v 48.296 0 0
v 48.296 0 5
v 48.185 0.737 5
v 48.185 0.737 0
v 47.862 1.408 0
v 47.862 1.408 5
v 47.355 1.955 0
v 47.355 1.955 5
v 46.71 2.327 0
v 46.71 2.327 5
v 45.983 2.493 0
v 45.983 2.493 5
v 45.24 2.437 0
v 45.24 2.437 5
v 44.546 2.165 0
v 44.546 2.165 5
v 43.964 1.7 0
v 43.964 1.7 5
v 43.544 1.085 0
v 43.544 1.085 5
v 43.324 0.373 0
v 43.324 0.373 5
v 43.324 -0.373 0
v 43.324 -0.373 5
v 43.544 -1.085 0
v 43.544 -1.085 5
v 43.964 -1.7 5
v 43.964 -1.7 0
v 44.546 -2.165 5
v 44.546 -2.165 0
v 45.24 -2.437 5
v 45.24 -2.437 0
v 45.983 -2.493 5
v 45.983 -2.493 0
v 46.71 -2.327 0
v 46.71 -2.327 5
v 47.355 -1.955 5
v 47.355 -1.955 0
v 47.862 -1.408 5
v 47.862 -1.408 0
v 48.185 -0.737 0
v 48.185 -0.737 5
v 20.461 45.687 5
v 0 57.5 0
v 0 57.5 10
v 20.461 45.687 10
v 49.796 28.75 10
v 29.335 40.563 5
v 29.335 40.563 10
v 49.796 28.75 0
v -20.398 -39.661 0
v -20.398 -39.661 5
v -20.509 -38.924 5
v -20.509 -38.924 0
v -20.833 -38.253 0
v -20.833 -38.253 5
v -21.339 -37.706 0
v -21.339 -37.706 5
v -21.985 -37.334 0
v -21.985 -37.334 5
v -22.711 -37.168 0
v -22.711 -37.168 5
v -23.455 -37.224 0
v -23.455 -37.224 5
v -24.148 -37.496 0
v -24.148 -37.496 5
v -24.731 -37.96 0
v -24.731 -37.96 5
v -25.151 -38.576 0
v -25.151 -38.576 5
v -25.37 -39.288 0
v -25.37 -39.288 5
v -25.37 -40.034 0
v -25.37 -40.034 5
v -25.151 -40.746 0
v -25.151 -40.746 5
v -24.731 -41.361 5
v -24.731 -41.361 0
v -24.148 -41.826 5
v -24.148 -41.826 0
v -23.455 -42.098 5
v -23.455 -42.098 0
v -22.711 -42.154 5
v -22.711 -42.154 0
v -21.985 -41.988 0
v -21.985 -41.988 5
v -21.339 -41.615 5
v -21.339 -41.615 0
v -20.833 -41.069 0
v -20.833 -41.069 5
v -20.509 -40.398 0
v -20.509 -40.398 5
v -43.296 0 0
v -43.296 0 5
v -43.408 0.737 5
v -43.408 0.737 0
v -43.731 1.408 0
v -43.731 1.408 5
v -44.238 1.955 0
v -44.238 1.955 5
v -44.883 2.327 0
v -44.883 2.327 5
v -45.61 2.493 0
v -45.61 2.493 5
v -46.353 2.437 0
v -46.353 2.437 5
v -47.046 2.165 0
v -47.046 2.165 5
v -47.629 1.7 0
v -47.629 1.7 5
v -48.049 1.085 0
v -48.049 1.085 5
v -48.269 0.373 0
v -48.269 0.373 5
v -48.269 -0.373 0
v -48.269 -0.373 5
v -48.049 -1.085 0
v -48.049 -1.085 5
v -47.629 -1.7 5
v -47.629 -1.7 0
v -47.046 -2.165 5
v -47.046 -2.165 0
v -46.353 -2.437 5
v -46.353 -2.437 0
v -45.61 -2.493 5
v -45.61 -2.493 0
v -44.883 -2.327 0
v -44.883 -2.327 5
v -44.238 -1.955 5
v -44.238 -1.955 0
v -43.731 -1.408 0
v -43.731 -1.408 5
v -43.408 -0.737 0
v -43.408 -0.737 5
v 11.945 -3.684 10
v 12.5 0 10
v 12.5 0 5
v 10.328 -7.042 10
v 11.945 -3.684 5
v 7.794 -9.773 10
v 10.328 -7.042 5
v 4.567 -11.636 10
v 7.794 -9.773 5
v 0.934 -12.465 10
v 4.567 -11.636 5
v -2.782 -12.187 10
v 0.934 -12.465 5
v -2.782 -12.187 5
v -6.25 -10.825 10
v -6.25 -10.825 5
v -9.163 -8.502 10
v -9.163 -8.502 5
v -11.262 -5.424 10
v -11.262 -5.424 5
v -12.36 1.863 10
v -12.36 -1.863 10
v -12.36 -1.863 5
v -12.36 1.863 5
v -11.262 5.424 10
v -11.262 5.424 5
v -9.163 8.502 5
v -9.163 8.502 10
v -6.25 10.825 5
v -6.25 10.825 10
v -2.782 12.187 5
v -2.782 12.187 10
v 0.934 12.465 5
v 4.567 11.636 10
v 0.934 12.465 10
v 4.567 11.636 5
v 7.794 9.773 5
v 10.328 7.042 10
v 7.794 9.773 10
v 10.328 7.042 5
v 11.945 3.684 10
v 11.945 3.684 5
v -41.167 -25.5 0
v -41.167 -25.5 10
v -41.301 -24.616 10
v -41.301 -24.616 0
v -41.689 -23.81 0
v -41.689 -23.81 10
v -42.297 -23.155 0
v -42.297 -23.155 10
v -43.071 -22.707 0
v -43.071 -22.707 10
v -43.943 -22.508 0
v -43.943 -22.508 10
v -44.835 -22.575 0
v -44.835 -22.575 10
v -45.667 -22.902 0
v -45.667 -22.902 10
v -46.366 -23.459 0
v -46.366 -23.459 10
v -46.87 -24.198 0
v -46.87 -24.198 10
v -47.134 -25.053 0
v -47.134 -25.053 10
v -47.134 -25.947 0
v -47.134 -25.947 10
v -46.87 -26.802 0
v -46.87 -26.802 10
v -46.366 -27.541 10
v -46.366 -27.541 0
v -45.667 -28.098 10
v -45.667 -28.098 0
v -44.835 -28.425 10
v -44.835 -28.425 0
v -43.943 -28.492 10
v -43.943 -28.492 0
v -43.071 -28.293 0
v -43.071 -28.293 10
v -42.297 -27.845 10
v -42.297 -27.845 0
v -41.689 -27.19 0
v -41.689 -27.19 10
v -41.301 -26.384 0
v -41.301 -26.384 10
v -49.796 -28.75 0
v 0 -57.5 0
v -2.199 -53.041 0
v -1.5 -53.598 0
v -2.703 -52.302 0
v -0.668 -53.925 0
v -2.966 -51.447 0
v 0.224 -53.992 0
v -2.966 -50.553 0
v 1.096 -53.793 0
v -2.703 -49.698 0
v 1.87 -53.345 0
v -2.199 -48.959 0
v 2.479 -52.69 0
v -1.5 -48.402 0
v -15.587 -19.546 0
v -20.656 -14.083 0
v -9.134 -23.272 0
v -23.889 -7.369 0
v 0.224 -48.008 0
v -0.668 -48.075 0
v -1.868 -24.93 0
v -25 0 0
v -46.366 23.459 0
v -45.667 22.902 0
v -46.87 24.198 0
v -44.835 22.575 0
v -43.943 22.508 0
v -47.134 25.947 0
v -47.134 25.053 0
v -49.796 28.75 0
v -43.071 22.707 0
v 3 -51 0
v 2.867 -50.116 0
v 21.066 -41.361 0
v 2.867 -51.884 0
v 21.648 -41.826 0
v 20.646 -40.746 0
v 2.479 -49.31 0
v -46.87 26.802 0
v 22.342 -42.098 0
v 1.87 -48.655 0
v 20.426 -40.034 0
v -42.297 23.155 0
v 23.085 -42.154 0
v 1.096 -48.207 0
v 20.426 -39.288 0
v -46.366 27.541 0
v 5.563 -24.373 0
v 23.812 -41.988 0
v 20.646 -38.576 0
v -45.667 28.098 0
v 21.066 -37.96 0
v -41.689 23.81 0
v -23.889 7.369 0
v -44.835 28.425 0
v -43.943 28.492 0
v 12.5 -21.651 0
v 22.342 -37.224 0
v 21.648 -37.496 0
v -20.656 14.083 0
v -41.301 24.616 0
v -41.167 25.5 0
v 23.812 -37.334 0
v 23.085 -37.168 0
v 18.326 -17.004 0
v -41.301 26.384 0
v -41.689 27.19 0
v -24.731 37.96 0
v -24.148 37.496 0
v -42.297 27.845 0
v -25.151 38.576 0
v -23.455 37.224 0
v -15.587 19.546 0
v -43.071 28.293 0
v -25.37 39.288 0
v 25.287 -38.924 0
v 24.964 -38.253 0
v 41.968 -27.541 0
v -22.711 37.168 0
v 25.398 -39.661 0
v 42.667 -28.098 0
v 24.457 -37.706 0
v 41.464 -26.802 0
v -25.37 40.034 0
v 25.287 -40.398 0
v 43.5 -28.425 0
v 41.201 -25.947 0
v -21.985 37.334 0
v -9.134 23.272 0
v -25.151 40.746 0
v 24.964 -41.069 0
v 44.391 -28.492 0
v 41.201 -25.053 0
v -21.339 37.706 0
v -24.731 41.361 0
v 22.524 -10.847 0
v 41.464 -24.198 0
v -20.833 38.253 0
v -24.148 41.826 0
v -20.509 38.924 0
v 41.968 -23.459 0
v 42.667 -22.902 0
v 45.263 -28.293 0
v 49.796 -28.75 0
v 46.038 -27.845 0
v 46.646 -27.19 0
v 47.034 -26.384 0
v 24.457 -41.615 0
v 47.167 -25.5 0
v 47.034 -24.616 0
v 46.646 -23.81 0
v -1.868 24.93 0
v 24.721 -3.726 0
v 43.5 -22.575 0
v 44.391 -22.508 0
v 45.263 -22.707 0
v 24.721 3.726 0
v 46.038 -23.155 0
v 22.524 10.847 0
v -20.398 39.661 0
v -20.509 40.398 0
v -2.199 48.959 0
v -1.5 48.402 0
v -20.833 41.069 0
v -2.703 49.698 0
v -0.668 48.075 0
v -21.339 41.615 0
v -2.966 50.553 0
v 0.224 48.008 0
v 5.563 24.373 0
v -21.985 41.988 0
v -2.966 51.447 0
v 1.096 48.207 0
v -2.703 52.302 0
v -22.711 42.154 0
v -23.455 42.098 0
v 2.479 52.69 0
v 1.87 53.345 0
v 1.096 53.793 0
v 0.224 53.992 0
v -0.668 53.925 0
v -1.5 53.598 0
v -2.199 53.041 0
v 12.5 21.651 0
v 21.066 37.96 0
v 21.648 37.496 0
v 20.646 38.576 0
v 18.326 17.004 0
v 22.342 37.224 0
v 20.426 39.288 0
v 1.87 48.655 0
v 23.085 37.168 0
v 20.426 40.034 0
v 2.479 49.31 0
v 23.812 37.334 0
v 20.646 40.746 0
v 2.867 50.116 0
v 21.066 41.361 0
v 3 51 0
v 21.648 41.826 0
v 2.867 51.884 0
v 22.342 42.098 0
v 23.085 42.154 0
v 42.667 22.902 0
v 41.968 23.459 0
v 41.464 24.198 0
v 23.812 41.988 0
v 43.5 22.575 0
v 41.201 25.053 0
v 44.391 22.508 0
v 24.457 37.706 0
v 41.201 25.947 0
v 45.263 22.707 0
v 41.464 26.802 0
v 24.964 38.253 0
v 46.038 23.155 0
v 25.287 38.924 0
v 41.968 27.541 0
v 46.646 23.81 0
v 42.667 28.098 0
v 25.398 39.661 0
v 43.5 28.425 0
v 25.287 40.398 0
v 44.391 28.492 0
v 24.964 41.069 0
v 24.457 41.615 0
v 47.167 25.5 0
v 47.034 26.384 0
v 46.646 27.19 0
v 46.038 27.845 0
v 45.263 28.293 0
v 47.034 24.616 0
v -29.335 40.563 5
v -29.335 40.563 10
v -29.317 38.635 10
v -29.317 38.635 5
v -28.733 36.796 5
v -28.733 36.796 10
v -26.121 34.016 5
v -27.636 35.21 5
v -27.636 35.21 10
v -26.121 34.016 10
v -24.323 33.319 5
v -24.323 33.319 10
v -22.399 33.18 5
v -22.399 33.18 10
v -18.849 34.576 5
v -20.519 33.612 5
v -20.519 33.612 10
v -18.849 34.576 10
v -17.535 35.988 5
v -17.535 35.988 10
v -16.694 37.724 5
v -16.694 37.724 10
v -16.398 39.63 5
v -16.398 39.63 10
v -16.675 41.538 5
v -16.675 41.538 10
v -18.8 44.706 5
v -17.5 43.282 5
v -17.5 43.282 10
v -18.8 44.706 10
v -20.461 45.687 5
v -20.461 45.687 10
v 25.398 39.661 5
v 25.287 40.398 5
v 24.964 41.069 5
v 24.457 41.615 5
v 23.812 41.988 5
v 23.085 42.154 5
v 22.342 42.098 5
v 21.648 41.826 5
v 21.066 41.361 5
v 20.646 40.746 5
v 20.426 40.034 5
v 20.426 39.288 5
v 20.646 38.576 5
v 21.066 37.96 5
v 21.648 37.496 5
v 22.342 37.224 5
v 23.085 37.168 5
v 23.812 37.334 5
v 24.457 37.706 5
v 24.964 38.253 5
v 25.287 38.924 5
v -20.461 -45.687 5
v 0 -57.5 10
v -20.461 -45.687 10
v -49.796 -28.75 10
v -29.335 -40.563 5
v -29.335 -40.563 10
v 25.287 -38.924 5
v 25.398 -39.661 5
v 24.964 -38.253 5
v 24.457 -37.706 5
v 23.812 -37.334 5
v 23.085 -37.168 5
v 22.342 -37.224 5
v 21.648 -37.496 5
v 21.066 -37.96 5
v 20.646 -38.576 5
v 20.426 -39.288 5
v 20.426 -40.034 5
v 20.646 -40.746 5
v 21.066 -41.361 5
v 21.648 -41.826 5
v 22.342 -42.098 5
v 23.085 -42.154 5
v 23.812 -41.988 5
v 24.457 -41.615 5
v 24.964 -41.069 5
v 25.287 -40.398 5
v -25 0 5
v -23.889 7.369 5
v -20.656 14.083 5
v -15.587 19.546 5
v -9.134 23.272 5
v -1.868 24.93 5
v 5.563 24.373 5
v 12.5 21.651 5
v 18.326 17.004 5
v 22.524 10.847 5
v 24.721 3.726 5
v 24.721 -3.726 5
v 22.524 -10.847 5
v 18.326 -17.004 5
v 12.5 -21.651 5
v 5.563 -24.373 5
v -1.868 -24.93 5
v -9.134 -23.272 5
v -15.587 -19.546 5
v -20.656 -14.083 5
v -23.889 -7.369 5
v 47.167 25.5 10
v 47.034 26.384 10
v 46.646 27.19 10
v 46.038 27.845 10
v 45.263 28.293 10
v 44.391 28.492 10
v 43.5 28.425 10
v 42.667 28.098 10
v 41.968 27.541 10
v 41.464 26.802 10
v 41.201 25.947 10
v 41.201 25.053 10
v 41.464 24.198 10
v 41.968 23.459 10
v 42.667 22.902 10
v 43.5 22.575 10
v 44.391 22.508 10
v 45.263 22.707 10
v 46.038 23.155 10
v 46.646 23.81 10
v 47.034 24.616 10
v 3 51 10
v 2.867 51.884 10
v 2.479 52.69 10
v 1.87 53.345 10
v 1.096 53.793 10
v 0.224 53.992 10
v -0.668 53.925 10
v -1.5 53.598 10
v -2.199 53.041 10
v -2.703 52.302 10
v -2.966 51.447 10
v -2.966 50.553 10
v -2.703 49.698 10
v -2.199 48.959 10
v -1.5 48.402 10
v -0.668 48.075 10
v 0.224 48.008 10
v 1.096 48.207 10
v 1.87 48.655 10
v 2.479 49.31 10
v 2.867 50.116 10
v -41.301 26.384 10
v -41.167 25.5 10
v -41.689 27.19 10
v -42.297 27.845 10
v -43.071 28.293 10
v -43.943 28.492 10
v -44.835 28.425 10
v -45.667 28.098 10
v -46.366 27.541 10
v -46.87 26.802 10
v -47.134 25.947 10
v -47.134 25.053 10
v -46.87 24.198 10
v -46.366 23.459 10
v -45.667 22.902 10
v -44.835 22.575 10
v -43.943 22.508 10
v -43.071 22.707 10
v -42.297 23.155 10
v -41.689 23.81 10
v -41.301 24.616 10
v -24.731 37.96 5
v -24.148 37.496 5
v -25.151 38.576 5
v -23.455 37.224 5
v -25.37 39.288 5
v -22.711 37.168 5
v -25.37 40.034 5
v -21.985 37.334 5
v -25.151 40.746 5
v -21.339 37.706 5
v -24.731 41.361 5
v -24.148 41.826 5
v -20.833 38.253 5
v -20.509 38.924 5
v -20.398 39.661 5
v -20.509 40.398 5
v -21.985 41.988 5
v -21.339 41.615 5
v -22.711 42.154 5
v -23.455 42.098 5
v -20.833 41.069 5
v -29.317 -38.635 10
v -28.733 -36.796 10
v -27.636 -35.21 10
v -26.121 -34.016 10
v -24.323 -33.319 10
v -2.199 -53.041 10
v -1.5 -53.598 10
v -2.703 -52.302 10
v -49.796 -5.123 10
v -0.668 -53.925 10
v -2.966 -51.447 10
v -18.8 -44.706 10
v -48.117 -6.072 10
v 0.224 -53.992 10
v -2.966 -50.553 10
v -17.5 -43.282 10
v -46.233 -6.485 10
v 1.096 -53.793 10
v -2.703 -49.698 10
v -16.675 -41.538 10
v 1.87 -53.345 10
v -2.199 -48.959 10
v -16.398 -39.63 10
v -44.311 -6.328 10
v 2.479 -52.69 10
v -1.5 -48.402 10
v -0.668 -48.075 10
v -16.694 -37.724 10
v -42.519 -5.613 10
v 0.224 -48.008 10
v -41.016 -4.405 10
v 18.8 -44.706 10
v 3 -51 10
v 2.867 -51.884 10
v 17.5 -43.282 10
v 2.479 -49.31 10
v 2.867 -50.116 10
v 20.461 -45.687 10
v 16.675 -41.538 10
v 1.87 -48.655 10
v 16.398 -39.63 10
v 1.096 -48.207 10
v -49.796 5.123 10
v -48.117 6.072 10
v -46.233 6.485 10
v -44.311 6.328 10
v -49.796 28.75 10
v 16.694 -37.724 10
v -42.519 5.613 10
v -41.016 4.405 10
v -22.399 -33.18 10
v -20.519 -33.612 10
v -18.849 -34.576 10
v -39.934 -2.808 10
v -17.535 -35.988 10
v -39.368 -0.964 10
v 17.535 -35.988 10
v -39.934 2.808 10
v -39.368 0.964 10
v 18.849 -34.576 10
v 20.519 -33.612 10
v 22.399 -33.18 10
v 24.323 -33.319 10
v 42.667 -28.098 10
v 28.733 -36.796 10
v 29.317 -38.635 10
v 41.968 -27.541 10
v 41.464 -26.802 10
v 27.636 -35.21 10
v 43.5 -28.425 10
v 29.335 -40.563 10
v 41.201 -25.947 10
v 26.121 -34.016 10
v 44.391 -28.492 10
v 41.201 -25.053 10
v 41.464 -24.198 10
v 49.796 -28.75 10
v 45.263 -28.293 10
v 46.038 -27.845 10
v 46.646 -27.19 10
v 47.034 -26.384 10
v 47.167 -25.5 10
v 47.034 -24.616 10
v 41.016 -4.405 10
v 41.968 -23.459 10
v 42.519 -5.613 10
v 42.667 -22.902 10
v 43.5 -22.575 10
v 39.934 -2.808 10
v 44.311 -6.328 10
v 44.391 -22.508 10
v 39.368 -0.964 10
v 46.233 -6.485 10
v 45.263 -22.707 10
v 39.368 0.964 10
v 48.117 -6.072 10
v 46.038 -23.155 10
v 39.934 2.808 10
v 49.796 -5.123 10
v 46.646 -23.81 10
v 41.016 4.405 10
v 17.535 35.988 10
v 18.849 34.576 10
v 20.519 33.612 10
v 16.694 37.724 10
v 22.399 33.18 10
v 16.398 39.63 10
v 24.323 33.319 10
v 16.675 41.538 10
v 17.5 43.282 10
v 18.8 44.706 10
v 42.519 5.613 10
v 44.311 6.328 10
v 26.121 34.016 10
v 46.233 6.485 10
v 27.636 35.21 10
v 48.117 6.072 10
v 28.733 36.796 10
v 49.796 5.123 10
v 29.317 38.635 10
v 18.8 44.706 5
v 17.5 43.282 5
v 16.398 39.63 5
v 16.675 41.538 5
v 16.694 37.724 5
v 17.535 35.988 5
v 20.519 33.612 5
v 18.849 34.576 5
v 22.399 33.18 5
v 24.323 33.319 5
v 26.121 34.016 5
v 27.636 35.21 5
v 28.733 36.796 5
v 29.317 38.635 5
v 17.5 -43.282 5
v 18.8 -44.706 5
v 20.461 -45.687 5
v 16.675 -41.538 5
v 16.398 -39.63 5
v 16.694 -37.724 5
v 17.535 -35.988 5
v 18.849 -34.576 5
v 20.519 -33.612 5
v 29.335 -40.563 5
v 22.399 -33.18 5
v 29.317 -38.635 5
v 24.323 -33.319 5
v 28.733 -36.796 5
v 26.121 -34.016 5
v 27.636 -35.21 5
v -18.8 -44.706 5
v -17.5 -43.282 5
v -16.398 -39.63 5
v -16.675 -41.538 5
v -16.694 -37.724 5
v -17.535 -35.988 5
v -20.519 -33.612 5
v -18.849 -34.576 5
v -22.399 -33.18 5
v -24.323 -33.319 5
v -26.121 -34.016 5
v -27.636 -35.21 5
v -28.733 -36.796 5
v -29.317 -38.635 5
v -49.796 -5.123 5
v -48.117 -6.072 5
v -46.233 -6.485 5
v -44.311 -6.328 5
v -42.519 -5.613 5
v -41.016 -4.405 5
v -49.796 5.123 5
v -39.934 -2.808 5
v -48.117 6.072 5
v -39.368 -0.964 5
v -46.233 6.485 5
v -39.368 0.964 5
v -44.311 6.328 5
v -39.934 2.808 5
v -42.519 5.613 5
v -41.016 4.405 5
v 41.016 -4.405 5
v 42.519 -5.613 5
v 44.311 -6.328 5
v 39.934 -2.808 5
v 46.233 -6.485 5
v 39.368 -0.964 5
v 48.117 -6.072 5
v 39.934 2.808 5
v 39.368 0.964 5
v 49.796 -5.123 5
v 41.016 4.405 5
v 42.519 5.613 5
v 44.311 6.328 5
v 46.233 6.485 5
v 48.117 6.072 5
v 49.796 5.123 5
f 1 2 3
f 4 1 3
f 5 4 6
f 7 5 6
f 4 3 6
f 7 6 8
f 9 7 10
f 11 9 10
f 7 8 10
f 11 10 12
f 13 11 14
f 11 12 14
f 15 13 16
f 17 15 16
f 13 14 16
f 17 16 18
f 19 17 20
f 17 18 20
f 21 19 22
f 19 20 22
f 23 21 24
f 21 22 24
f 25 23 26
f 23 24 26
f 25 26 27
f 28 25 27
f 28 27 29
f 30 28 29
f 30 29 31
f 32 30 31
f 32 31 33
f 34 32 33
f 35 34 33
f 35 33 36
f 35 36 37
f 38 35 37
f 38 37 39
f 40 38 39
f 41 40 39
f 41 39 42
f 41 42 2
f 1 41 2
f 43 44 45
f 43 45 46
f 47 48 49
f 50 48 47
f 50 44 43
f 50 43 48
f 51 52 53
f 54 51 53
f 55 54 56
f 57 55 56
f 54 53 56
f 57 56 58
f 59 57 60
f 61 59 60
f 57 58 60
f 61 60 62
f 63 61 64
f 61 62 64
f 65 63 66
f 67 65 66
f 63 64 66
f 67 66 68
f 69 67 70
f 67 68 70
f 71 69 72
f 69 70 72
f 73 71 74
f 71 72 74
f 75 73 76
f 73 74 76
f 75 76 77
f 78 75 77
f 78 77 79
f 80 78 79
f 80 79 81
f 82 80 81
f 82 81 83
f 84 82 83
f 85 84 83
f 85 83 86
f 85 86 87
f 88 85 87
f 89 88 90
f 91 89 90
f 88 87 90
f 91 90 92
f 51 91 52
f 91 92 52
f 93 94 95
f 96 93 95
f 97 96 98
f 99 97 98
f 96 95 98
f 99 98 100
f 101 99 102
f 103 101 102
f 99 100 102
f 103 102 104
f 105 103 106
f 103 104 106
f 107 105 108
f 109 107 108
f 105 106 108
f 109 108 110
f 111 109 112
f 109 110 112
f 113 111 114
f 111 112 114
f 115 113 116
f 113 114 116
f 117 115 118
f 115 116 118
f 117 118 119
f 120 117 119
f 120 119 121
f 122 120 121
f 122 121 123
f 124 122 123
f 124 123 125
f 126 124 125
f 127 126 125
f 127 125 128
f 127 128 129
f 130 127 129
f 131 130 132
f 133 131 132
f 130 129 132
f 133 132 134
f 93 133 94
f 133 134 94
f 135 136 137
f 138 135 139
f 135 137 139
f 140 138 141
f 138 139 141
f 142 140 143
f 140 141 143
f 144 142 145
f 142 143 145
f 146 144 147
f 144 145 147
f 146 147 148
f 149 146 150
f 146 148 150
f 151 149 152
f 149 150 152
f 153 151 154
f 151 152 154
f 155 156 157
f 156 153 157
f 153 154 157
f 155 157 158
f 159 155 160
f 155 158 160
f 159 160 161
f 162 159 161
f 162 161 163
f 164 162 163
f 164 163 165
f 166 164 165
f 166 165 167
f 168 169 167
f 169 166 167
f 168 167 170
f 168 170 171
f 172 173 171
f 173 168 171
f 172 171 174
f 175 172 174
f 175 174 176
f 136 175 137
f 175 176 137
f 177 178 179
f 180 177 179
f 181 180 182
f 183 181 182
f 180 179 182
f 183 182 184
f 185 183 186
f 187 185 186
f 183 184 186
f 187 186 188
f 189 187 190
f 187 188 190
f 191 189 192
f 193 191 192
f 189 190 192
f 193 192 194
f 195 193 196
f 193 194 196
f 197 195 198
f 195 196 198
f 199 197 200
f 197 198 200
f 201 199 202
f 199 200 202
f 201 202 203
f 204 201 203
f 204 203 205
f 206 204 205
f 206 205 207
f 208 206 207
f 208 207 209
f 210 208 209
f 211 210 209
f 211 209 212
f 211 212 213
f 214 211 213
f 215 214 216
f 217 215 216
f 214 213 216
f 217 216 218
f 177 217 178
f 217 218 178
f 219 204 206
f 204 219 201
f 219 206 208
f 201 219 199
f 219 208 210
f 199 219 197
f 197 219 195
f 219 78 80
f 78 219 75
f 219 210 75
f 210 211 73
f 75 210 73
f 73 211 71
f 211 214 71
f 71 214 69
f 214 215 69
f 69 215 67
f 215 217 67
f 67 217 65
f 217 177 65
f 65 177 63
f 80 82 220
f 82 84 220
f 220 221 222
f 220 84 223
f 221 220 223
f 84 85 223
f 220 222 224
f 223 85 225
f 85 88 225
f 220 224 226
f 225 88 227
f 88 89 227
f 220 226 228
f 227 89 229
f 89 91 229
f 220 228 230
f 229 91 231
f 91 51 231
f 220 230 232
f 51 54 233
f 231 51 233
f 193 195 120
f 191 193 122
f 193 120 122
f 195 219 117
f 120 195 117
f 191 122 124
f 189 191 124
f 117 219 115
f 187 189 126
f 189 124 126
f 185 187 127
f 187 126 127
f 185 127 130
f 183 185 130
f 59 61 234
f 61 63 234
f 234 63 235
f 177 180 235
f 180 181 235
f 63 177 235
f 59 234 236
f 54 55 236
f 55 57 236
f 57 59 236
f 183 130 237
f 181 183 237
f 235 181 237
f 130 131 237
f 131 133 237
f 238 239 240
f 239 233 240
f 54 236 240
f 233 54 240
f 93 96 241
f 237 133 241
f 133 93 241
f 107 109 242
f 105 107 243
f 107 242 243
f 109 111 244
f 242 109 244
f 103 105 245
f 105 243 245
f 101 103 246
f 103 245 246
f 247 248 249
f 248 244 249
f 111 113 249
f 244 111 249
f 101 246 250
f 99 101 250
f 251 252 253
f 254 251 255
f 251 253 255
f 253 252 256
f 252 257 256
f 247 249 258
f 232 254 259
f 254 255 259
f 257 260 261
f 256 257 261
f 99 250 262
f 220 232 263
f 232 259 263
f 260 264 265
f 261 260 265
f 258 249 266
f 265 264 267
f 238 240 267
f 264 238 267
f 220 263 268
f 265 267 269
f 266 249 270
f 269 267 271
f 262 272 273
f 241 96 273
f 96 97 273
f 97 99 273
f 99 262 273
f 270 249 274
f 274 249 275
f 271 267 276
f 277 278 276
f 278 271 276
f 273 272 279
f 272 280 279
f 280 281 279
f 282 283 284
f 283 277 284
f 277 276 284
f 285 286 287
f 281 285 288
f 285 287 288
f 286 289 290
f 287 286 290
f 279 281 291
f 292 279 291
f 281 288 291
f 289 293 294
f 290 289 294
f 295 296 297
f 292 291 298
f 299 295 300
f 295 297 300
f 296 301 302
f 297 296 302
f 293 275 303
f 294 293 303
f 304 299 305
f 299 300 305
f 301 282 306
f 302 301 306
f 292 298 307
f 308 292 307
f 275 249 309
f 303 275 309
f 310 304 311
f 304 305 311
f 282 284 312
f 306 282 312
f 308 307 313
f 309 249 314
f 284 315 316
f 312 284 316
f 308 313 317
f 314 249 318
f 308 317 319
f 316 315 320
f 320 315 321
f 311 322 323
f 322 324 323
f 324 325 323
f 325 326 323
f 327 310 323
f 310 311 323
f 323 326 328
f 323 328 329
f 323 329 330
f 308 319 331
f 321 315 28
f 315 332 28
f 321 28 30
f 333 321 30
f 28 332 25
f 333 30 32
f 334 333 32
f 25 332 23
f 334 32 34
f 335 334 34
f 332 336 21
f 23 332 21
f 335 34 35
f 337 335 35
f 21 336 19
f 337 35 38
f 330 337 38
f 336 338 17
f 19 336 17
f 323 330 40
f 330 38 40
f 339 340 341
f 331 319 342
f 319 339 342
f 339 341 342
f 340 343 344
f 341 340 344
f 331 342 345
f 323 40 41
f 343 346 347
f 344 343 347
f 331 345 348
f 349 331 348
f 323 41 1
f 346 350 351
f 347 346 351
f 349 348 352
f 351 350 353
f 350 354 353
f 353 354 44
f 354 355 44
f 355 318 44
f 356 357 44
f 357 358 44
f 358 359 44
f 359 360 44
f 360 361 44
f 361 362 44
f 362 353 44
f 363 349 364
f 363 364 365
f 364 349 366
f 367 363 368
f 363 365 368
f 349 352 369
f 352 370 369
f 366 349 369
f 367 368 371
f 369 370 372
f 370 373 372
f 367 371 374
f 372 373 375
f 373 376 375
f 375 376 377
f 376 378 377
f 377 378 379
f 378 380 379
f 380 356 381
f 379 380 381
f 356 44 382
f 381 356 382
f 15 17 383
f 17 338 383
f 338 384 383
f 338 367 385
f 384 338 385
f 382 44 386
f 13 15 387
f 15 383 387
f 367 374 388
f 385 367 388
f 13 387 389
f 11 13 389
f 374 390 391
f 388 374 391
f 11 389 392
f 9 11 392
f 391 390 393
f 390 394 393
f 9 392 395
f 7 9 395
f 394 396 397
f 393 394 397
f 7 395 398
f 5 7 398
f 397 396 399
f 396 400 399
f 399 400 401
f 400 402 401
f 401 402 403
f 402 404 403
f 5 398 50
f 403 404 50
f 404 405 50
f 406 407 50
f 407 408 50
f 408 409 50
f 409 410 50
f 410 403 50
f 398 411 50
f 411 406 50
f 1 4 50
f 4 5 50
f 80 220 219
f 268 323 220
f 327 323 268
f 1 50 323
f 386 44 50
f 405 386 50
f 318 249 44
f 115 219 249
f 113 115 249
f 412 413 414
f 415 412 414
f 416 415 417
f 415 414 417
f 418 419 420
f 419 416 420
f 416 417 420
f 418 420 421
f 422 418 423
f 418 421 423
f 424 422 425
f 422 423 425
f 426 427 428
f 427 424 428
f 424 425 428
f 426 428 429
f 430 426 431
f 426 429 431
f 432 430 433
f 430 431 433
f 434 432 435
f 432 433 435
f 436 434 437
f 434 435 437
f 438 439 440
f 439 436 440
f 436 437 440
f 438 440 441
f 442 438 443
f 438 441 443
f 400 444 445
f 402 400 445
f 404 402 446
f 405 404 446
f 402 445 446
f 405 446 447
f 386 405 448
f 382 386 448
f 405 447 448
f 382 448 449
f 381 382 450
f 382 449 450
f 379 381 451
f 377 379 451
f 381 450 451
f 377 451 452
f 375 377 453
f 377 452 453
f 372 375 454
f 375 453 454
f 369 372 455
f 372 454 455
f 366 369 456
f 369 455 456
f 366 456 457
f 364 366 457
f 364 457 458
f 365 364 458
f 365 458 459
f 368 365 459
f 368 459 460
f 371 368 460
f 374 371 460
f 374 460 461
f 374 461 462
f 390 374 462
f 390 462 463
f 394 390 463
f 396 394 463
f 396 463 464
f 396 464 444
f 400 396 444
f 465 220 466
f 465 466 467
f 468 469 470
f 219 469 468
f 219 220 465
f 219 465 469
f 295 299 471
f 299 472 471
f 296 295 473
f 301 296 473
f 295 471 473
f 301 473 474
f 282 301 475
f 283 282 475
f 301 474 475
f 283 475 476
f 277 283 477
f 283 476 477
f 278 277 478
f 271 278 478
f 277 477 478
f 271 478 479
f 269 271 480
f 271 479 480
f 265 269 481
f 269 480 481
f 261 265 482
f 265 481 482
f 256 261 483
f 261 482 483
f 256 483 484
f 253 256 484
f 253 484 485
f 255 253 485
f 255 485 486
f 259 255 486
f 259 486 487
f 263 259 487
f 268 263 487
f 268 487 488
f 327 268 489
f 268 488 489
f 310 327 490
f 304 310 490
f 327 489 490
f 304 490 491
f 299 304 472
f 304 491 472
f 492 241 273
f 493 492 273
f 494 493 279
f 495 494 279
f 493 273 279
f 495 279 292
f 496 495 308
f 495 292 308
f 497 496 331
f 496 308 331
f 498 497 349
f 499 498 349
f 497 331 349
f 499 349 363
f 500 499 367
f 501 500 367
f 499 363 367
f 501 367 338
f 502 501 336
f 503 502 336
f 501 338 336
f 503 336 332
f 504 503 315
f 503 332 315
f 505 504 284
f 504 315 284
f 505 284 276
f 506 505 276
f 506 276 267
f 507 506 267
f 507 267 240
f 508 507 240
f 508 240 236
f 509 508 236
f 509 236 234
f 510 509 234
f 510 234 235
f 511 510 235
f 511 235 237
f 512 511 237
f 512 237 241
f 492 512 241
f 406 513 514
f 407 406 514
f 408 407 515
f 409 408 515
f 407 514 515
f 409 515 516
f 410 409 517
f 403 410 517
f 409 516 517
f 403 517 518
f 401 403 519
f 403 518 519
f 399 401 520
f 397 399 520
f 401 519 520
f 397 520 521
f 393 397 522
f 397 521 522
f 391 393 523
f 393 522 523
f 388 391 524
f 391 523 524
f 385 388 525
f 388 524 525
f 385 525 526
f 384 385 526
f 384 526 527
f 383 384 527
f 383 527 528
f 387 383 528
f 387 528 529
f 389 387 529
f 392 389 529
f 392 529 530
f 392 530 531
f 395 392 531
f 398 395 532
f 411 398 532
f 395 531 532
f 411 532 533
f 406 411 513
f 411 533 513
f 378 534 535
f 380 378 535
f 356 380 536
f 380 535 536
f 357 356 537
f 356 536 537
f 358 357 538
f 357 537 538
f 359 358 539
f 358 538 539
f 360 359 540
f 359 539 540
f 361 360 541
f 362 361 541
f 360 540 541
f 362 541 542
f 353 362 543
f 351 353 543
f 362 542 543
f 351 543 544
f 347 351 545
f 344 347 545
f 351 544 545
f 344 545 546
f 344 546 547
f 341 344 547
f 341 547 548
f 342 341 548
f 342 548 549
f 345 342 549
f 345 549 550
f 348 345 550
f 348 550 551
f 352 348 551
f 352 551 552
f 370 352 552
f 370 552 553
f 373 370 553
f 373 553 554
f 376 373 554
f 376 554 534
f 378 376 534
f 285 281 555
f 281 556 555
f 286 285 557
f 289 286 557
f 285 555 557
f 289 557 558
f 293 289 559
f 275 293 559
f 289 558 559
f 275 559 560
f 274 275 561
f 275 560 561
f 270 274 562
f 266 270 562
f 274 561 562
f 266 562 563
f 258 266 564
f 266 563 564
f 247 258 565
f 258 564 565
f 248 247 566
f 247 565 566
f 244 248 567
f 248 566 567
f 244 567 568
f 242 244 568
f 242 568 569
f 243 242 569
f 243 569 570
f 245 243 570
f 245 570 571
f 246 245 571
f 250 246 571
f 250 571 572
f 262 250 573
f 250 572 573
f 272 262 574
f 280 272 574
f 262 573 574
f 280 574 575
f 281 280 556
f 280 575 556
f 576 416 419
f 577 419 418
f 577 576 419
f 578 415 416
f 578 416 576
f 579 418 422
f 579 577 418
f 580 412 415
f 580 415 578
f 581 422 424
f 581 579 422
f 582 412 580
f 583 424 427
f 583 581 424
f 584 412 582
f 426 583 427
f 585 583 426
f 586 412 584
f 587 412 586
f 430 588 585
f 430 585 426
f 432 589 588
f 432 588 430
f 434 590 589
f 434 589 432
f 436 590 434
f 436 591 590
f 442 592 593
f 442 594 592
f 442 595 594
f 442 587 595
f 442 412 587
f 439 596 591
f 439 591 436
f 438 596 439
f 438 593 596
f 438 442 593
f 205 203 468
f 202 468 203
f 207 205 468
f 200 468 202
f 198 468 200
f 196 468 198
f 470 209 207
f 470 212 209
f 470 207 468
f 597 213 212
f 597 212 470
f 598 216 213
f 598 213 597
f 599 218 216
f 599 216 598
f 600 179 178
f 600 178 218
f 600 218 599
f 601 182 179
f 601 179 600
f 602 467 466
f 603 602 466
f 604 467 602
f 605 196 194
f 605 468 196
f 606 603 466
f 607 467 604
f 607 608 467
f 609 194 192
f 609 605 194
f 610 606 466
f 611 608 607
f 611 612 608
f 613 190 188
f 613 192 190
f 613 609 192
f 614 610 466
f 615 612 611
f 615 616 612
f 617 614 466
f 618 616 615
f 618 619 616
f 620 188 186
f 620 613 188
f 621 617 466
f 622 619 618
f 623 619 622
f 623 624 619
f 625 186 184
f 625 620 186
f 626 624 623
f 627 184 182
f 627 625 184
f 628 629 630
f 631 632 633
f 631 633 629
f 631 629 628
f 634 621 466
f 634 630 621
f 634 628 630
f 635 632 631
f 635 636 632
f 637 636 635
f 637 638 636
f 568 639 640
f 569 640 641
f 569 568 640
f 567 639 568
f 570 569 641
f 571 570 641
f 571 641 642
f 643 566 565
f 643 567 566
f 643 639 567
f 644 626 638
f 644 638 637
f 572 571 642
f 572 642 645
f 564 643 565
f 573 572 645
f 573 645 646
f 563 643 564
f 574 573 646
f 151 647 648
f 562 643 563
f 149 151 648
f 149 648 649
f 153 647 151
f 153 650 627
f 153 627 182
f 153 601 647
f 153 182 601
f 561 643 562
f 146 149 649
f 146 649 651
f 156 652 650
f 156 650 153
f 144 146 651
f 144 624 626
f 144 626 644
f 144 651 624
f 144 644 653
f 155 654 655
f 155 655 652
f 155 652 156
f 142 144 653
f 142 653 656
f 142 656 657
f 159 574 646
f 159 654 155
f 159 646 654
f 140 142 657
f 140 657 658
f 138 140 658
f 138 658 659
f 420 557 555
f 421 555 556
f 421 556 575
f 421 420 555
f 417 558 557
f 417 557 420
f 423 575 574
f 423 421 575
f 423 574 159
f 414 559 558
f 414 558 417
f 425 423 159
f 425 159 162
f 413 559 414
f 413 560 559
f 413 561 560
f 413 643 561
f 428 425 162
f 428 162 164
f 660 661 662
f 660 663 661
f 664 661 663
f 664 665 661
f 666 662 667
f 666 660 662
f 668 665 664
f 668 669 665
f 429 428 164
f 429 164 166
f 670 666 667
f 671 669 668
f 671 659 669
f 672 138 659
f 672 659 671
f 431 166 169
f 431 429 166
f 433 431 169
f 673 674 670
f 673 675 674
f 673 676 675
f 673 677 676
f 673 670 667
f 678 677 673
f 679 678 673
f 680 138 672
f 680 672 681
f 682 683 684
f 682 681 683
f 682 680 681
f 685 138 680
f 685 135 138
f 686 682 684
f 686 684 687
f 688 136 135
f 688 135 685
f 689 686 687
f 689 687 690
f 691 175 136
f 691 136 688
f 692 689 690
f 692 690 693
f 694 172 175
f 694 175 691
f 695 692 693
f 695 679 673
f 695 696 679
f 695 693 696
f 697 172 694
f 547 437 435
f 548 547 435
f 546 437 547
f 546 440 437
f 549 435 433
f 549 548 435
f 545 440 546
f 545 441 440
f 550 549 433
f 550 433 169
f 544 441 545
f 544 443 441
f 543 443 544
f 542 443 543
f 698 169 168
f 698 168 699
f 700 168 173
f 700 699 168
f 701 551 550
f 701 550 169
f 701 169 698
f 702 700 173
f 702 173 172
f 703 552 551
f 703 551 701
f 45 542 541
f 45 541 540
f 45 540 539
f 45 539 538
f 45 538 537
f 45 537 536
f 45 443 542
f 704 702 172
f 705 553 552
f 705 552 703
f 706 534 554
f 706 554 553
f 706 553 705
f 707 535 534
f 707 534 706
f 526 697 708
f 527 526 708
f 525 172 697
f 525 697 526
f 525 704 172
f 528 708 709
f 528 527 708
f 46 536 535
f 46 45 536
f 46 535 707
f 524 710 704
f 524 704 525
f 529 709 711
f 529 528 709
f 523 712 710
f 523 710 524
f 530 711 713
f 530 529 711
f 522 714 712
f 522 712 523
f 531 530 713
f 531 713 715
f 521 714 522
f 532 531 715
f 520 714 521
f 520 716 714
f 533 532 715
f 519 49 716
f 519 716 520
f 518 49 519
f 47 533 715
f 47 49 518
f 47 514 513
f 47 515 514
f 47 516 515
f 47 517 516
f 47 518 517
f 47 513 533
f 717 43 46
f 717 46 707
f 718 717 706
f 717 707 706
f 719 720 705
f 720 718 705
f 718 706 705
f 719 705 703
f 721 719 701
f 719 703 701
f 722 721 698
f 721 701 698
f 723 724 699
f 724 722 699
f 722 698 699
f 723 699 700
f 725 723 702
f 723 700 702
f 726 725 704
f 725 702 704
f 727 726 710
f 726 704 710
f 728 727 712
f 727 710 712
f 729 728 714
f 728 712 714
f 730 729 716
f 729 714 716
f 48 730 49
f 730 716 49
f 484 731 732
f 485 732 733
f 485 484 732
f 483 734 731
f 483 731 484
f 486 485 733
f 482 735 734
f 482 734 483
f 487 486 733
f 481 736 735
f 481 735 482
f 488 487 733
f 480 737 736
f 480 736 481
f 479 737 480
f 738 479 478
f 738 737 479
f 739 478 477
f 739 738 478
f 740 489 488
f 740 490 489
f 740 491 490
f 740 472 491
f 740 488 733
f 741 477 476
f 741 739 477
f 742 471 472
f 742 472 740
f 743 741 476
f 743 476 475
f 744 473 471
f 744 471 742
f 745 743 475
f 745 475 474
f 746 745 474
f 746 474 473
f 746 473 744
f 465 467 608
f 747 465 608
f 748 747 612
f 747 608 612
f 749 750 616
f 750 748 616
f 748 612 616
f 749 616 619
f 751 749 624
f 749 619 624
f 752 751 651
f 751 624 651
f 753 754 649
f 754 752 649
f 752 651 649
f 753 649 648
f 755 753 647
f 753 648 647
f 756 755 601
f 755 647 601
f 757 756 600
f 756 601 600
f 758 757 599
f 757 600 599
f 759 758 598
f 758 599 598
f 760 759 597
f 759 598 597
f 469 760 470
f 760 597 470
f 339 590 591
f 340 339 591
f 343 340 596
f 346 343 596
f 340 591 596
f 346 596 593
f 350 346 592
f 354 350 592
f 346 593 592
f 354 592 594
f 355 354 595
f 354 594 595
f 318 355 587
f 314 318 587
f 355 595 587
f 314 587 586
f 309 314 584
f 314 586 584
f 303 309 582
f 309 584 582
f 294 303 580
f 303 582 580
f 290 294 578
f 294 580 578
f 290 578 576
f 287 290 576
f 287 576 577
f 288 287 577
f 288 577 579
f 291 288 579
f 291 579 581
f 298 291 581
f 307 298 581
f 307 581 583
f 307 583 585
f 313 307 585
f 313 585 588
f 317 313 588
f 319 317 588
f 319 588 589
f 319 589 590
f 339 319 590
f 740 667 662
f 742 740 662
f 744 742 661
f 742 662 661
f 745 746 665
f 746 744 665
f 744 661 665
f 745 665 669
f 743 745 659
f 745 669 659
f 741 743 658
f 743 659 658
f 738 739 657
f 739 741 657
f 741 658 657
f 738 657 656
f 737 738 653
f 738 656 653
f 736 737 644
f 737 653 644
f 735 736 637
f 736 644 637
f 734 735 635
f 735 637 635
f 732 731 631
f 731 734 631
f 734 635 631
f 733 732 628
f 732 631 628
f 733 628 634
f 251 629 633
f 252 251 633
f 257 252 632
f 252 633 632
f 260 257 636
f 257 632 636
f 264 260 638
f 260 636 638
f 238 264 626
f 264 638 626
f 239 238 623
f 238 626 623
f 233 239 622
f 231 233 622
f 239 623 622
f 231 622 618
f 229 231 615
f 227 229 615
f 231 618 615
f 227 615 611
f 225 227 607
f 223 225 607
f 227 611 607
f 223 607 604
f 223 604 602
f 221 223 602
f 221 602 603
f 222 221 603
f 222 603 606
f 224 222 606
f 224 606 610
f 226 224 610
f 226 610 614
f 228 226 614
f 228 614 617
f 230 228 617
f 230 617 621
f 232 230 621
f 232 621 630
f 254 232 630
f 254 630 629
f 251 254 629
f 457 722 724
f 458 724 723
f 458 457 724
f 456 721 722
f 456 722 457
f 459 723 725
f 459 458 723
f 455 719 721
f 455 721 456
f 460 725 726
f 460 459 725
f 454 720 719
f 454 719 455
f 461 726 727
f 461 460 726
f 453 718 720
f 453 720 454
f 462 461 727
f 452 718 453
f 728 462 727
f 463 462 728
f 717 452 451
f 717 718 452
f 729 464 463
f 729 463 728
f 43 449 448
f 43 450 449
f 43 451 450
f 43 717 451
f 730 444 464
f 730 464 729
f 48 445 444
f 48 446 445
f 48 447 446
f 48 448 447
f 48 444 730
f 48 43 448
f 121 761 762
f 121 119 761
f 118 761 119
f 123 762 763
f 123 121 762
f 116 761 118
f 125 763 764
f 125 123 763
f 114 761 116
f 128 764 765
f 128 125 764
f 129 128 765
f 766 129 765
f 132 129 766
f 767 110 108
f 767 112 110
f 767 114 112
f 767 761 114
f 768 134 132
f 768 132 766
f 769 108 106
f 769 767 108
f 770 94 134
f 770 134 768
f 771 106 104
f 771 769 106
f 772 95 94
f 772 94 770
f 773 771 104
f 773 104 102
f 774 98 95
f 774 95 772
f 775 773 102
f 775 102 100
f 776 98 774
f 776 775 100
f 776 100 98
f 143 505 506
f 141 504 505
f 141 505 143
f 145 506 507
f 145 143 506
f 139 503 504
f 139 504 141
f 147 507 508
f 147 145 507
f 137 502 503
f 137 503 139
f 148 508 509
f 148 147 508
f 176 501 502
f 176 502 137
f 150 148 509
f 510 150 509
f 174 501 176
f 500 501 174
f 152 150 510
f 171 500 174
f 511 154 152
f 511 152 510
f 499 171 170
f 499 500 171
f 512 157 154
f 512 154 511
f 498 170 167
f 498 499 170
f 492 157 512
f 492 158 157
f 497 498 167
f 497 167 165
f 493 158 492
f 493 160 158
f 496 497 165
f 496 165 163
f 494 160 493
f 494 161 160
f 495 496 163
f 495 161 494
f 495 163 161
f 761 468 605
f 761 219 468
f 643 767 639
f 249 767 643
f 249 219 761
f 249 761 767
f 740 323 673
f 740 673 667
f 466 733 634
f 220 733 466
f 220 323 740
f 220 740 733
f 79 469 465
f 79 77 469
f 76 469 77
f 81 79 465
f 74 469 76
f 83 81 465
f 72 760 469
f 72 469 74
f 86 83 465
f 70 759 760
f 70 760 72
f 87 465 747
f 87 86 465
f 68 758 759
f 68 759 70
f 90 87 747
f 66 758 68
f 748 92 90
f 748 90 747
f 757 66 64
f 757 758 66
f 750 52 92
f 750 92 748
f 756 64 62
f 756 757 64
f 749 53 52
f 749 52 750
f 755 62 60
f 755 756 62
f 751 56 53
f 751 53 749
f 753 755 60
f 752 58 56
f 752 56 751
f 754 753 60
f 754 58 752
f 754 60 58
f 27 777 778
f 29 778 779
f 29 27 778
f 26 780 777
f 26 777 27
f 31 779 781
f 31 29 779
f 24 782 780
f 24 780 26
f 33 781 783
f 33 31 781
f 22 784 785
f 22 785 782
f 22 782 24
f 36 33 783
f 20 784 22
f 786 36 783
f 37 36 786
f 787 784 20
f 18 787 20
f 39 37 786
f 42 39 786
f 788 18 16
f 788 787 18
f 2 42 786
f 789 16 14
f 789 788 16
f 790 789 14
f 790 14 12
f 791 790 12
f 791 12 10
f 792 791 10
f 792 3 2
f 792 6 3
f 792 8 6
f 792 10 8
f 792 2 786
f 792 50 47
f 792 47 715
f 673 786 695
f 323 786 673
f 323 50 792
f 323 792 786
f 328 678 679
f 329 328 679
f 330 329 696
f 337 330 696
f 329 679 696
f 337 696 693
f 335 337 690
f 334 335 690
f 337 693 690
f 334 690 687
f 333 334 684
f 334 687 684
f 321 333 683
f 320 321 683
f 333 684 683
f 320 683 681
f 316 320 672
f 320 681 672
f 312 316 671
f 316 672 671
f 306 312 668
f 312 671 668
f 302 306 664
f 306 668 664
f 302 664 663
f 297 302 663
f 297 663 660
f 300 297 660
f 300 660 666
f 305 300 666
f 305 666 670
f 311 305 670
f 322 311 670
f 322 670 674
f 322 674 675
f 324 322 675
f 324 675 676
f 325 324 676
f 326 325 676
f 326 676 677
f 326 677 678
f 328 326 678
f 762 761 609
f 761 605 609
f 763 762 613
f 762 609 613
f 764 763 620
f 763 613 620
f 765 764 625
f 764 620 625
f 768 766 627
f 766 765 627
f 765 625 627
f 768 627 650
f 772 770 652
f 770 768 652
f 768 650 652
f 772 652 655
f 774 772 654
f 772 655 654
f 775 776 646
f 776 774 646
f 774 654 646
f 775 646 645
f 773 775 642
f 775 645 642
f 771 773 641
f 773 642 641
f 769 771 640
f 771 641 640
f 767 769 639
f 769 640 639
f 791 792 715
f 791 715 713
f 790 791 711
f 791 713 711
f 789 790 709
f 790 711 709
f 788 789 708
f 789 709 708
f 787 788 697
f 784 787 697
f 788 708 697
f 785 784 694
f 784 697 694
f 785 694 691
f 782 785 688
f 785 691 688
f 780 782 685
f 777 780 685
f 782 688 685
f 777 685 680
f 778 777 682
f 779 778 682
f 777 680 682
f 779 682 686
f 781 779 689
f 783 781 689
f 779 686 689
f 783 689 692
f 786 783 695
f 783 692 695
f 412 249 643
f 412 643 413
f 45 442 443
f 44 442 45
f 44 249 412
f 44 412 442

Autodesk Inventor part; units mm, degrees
ref_plane "YZ Plane" through (0, 0, 0) normal (1, 0, 0) x (0, 1, 0)
ref_plane "XZ Plane" through (0, 0, 0) normal (0, 1, 0) x (-1, 0, 0)
ref_plane "XY Plane" through (0, 0, 0) normal (0, 0, 1) x (1, 0, 0)
sketch "Sketch1" plane through (0, 0, 0) normal (0, 0, 1) x (1, 0, 0)
  circle A0 centre (0, 0) radius 12.5
  circle A1 centre (-30, 0) radius 3
  circle A2 centre (-15, -25.9808) radius 3
  circle A3 centre (15, -25.9808) radius 3
  circle A4 centre (30, 0) radius 3
  circle A5 centre (15, 25.9808) radius 3
  circle A6 centre (-15, 25.9808) radius 3
  line L0 (0, 57.5) -> (49.7965, 28.75)
  line L1 (49.7965, 28.75) -> (49.7965, -28.75)
  line L2 (49.7965, -28.75) -> (0, -57.5)
  line L3 (0, -57.5) -> (-49.7965, -28.75)
  line L4 (-49.7965, -28.75) -> (-49.7965, 28.75)
  line L5 (-49.7965, 28.75) -> (0, 57.5)
  point P0 (49.7965, 0)
  dimension "d0" = 25
  dimension "d2" = 6
  dimension "d6" = 360
  dimension "d15" = 30
  dimension "d33" = 115
extrude "Extrusion1" add sketch "Sketch1" along normal blind 10 contours A1 | A2 | A3 | A4 | A5 | A6 | L0 L1 L2 L3 L4 L5
sketch "Sketch7" plane through (0, 0, 10) normal (0, 0, 1) x (1, 0, 0)
  circle A0 centre (0, 51) radius 3
  circle A1 centre (-44.1673, 25.5) radius 3
  circle A2 centre (-44.1673, -25.5) radius 3
  circle A3 centre (0, -51) radius 3
  circle A4 centre (44.1673, -25.5) radius 3
  circle A5 centre (44.1673, 25.5) radius 3
  line L0 (0, 51) -> (0, -51)
  point P0 (0, 0)
  dimension "d42" = 6
  dimension "d46" = 360
  dimension "d96" = 102
extrude "Extrusion6" cut sketch "Sketch7" against normal through all
sketch "Sketch9" plane through (0, 0, 0) normal (0, 0, -1) x (-1, 0, 0)
  circle A0 centre (0, 0) radius 25
  dimension "d56" = 50
extrude "Extrusion8" cut sketch "Sketch9" against normal blind 5
sketch "Sketch14" plane through (0, 0, 10) normal (0, 0, 1) x (1, 0, 0)
  circle A0 centre (-45.7965, 0) radius 2.5
  circle A1 centre (-22.8982, -39.6609) radius 2.5
  circle A2 centre (22.8982, -39.6609) radius 2.5
  circle A3 centre (45.7965, 0) radius 2.5
  circle A4 centre (22.8982, 39.6609) radius 2.5
  circle A5 centre (-22.8982, 39.6609) radius 2.5
  line L0 (-49.7965, 28.75) -> (-49.7965, -28.75) projected
  point P0 (0, 0)
  point P1 (-45.7965, 0)
  dimension "d81" = 5
  dimension "d85" = 360
  dimension "d97" = 4
extrude "Extrusion13" cut sketch "Sketch14" against normal through all
sketch "Sketch15" plane through (0, 0, 10) normal (0, 0, 1) x (1, 0, 0)
  circle A0 centre (-22.8982, 39.6609) radius 2.5 projected
  circle A1 centre (-22.8982, 39.6609) radius 6.5
  circle A2 centre (-45.7965, 0) radius 6.5
  circle A3 centre (-22.8982, -39.6609) radius 6.5
  circle A4 centre (22.8982, -39.6609) radius 6.5
  circle A5 centre (45.7965, 0) radius 6.5
  circle A6 centre (22.8982, 39.6609) radius 6.5
  point P0 (0, 0)
  dimension "d89" = 13
  dimension "d92" = 360
extrude "Extrusion14" cut sketch "Sketch15" against normal blind 5 contours A0 | A1 | A2 | A3 | A4 | A5 | A6
properties part number "TA01" material "ABS Plastic"
